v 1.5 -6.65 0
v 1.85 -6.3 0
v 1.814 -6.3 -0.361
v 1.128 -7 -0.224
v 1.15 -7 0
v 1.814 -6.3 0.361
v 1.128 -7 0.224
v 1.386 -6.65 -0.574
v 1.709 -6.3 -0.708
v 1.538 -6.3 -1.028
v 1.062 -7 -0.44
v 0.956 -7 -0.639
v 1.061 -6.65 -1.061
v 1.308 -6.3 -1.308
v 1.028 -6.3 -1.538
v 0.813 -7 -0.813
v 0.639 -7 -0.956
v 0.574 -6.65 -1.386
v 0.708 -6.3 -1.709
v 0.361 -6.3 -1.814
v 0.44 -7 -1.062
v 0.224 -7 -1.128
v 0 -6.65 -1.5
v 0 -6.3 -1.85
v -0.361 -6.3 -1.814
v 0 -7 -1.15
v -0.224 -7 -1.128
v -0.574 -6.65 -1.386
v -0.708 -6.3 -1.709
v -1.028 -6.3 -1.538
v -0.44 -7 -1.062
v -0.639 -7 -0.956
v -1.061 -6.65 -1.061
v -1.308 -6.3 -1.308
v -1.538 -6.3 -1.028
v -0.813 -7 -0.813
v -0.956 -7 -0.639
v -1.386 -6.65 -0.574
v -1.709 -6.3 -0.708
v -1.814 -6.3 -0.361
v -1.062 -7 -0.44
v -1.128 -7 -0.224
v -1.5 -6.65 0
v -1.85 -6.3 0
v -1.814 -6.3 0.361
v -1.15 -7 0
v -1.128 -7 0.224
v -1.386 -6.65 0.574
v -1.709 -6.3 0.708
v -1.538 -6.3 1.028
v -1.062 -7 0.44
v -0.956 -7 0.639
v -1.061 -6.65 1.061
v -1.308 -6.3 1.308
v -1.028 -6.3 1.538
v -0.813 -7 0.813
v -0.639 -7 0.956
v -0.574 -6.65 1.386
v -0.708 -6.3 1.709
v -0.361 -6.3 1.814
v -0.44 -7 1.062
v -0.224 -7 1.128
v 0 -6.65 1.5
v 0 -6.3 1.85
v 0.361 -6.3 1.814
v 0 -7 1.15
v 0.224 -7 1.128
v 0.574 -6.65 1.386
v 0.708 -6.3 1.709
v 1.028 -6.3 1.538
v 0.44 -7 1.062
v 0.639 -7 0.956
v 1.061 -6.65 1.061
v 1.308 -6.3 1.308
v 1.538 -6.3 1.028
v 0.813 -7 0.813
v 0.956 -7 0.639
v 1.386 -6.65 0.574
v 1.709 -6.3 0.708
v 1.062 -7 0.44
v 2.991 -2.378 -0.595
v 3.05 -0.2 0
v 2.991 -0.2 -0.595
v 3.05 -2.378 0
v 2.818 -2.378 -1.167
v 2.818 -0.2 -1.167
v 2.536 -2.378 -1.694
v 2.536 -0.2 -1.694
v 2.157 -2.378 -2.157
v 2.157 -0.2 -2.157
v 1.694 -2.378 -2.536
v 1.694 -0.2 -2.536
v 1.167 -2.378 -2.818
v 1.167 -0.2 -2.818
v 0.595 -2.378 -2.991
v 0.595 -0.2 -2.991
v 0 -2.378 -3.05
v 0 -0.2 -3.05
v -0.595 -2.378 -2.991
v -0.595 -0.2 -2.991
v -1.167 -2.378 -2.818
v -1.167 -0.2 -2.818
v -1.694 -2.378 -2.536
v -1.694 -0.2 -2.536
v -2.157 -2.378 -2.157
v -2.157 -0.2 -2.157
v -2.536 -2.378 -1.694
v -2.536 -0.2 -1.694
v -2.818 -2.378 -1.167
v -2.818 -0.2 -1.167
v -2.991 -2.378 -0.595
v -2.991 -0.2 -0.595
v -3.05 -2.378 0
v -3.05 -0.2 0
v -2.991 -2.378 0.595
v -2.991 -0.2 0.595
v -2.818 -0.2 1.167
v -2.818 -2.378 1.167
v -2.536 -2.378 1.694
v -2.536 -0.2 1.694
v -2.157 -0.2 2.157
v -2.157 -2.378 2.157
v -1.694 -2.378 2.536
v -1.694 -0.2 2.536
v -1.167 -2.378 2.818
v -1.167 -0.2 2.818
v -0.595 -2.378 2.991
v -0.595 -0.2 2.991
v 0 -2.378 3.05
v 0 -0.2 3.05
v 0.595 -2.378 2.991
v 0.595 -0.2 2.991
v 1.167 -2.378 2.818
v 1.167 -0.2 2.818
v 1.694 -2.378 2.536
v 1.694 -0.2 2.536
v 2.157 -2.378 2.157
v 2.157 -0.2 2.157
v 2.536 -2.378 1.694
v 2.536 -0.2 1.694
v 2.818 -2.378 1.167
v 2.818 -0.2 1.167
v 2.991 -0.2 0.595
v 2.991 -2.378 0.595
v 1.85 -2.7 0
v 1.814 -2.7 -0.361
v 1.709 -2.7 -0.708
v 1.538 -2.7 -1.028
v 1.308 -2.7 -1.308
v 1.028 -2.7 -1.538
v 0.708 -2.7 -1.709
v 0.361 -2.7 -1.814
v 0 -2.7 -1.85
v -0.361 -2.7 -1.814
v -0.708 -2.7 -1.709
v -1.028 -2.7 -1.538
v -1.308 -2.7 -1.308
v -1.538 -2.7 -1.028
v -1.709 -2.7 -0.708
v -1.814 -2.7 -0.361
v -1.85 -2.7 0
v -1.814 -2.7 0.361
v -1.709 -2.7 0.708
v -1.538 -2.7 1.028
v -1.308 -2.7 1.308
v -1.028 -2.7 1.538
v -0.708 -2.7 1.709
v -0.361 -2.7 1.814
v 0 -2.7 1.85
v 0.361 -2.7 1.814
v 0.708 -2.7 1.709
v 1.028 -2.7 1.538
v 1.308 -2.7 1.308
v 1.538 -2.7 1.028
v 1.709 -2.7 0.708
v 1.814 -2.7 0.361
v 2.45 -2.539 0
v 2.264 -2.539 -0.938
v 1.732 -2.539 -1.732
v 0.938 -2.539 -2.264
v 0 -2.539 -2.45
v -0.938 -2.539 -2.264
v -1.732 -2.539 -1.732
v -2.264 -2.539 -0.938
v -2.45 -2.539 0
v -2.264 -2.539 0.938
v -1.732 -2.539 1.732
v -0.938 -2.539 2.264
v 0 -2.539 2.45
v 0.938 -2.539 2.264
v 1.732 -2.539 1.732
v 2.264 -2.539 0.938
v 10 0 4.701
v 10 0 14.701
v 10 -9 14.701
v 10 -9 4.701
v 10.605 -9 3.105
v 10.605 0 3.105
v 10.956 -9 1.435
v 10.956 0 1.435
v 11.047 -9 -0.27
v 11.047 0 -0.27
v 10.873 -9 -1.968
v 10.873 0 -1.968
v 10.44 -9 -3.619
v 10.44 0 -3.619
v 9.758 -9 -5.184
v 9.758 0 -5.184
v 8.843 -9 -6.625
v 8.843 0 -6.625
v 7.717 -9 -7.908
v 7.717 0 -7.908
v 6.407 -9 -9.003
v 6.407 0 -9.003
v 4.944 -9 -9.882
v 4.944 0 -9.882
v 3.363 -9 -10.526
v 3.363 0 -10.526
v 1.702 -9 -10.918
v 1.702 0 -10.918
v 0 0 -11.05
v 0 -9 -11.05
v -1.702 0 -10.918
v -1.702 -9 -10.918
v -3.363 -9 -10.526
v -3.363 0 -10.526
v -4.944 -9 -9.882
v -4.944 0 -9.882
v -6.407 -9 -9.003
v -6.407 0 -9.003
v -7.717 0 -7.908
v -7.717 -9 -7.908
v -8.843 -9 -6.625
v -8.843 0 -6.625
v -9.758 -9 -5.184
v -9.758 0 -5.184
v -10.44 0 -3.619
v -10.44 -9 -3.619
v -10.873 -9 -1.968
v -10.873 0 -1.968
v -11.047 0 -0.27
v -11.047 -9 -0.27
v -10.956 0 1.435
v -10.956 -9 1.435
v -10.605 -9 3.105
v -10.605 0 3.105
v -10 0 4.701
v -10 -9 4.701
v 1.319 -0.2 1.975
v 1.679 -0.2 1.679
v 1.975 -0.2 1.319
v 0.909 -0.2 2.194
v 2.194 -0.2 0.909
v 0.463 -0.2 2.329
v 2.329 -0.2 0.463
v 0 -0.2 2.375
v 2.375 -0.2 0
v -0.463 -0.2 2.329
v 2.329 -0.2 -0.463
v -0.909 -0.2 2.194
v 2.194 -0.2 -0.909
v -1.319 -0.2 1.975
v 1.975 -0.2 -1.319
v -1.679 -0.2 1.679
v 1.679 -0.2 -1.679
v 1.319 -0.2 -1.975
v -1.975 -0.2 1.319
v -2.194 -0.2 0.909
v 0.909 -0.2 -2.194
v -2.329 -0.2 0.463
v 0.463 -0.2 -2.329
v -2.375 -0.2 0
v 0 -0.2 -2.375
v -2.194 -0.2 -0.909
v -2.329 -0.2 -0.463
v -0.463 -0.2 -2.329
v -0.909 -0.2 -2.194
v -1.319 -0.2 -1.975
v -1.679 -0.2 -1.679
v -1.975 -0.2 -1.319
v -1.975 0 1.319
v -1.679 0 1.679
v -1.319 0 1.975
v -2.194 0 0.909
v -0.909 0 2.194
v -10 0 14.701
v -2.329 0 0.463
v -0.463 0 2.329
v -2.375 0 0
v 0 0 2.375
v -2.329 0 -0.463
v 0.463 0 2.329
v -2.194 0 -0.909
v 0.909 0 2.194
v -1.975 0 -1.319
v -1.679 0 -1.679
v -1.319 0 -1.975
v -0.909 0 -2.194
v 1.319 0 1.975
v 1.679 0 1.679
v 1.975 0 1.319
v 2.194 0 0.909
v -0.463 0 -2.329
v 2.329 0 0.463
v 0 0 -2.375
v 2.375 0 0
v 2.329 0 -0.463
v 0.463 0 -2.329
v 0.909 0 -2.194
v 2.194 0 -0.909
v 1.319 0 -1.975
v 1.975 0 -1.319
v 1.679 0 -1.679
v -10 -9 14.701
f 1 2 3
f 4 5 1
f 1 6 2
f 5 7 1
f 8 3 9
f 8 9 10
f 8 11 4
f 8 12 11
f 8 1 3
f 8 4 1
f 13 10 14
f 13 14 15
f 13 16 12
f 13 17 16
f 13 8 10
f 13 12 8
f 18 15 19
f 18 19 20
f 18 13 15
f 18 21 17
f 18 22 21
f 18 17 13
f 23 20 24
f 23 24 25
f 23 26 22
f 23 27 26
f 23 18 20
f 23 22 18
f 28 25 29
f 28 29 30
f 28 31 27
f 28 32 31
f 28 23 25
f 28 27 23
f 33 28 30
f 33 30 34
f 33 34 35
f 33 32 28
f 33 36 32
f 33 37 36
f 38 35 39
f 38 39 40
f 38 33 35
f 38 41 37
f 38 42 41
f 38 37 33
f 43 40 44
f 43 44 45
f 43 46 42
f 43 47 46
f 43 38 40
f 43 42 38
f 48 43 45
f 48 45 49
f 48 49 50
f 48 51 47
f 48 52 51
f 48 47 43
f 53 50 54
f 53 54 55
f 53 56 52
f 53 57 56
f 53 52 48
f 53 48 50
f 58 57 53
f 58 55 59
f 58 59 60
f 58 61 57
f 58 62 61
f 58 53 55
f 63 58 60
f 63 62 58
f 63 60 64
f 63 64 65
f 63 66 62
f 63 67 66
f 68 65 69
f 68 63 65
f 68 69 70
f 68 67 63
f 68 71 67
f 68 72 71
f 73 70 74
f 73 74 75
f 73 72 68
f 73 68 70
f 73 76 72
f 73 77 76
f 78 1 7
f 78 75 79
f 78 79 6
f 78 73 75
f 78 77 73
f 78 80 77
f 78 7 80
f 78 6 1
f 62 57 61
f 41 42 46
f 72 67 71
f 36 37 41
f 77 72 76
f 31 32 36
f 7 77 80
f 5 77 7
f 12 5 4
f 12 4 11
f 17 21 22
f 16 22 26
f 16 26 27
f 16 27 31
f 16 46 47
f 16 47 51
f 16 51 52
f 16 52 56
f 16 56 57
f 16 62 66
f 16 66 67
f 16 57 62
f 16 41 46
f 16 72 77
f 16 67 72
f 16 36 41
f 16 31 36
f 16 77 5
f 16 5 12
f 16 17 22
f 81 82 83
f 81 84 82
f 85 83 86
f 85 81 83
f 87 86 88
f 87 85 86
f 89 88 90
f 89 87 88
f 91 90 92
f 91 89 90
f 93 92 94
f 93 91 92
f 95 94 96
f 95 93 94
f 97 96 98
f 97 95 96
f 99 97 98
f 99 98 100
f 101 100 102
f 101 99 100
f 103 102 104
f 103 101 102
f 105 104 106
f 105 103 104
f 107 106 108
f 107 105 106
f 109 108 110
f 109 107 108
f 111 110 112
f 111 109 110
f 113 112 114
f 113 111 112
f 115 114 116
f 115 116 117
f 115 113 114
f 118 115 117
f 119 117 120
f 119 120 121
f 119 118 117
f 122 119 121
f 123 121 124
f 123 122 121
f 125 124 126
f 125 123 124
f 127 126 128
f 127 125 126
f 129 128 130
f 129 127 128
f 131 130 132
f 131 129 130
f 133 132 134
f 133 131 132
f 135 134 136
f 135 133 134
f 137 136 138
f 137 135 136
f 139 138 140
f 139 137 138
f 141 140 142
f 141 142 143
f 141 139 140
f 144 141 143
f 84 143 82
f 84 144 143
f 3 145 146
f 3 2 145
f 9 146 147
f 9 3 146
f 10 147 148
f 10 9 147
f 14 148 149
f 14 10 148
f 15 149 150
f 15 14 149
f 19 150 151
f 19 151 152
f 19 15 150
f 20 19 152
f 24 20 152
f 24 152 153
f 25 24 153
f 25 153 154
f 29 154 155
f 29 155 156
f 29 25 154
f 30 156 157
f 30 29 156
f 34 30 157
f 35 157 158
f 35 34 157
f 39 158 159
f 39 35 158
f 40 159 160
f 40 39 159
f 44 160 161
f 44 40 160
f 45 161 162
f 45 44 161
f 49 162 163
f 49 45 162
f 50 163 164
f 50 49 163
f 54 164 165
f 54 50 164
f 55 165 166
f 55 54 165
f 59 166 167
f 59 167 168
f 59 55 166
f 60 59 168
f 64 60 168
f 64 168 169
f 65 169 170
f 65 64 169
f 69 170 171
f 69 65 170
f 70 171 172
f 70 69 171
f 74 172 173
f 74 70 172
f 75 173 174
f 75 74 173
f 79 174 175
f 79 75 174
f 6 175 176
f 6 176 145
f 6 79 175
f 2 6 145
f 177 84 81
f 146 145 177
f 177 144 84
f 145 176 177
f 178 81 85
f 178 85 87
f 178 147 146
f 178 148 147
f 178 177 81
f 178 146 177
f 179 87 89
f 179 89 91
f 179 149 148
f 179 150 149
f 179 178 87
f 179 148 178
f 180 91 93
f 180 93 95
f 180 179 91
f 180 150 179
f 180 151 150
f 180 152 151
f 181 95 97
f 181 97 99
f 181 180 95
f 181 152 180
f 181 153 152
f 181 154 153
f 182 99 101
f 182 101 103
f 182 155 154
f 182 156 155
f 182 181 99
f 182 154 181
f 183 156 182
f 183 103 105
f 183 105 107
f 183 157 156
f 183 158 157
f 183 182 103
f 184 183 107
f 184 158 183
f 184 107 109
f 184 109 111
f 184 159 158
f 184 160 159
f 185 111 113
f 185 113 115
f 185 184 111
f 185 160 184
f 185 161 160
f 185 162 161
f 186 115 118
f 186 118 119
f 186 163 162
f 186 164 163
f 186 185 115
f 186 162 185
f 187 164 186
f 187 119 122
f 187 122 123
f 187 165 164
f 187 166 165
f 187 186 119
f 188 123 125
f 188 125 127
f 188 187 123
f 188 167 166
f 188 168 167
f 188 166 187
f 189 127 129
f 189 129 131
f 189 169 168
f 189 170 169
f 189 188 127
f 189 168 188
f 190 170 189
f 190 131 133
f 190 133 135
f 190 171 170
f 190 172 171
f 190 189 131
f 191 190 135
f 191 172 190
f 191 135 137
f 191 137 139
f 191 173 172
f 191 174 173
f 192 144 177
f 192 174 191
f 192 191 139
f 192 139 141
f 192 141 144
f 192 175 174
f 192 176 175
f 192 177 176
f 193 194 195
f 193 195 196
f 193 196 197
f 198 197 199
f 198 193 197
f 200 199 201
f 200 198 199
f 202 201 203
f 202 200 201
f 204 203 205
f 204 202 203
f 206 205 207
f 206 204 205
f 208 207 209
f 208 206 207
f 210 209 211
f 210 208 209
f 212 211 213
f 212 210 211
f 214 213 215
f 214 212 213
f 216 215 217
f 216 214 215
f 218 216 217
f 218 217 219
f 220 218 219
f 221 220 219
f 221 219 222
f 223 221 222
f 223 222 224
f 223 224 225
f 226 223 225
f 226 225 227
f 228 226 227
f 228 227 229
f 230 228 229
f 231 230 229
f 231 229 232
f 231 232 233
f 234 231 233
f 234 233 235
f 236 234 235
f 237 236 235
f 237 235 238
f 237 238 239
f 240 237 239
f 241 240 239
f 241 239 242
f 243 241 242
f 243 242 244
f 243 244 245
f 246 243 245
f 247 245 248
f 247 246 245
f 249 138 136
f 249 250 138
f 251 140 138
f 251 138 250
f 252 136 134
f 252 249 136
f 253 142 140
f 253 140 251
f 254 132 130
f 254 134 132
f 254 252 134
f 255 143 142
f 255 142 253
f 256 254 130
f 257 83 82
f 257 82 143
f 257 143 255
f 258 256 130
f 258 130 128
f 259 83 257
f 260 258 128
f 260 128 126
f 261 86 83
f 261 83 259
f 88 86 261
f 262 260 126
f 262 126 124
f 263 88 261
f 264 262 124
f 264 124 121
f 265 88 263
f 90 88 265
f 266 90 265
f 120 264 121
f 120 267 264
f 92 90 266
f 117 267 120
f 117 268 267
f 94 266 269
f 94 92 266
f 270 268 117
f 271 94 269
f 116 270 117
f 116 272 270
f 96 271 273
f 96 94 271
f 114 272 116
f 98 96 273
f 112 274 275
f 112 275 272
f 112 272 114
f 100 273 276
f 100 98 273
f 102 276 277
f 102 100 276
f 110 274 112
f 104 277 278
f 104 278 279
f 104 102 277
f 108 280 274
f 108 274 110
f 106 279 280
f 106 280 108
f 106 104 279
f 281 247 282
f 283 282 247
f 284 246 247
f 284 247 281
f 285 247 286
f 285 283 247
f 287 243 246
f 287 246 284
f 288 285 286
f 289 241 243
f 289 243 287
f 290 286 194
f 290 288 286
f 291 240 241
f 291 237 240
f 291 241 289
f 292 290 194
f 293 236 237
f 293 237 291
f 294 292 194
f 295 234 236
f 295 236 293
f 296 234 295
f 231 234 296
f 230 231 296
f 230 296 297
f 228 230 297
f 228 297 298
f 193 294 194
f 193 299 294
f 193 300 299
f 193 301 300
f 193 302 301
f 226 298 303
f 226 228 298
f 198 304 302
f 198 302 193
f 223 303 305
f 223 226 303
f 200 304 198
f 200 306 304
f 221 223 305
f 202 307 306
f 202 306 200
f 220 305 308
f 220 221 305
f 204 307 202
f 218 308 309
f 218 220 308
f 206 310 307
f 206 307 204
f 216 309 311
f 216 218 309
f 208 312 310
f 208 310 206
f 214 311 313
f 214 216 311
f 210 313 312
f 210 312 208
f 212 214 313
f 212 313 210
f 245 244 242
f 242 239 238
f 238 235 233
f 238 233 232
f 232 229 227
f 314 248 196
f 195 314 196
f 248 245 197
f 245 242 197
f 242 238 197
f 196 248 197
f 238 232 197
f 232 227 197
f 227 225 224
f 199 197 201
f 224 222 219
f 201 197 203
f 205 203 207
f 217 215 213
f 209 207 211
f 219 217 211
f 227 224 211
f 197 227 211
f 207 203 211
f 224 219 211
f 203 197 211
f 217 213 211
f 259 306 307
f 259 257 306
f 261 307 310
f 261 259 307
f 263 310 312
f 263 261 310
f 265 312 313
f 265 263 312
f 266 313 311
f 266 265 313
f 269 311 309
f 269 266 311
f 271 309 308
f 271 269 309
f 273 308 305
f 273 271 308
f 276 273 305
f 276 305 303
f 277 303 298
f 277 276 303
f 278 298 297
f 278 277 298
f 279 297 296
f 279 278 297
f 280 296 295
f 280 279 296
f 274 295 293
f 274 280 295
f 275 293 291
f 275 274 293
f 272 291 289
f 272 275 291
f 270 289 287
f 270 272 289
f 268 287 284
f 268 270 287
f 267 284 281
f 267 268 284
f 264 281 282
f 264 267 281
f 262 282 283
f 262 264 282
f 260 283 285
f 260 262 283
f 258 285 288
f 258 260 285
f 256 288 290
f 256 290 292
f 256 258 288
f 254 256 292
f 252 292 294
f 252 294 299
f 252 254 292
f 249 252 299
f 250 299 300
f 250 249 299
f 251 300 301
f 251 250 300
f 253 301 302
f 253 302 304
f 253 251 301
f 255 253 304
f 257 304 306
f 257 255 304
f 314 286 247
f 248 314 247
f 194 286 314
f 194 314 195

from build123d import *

# Parameters (mm, degrees)
SKETCH2_W           = 20
SKETCH2_H           = 10
BOSS_EXTRUDE1_DEPTH = 9


with BuildPart() as part:
    # Sketch1 → Revolve1 (revolve)
    with BuildSketch(Plane.XY):
        Polygon((11.05, 0), (2.375, 0), (2.375, -0.2), (3.05, -0.2), (3.05, -2.378460969), (1.85, -2.7), (1.85, -6.3), (1.15, -7), (0, -7), (0, -9), (11.05, -9), align=None)
    revolve(axis=Axis((0, 0, 0), (0, 1, 0)))

    # Sketch2 → Boss-Extrude1 (add)
    with BuildSketch(Plane(origin=(0, 0, 0), x_dir=(1, 0, 0), z_dir=(0, 1, 0))):
        with Locations((0, -9.701329599)):
            Rectangle(SKETCH2_W, SKETCH2_H)
    extrude(amount=-BOSS_EXTRUDE1_DEPTH)


solid = part.part
